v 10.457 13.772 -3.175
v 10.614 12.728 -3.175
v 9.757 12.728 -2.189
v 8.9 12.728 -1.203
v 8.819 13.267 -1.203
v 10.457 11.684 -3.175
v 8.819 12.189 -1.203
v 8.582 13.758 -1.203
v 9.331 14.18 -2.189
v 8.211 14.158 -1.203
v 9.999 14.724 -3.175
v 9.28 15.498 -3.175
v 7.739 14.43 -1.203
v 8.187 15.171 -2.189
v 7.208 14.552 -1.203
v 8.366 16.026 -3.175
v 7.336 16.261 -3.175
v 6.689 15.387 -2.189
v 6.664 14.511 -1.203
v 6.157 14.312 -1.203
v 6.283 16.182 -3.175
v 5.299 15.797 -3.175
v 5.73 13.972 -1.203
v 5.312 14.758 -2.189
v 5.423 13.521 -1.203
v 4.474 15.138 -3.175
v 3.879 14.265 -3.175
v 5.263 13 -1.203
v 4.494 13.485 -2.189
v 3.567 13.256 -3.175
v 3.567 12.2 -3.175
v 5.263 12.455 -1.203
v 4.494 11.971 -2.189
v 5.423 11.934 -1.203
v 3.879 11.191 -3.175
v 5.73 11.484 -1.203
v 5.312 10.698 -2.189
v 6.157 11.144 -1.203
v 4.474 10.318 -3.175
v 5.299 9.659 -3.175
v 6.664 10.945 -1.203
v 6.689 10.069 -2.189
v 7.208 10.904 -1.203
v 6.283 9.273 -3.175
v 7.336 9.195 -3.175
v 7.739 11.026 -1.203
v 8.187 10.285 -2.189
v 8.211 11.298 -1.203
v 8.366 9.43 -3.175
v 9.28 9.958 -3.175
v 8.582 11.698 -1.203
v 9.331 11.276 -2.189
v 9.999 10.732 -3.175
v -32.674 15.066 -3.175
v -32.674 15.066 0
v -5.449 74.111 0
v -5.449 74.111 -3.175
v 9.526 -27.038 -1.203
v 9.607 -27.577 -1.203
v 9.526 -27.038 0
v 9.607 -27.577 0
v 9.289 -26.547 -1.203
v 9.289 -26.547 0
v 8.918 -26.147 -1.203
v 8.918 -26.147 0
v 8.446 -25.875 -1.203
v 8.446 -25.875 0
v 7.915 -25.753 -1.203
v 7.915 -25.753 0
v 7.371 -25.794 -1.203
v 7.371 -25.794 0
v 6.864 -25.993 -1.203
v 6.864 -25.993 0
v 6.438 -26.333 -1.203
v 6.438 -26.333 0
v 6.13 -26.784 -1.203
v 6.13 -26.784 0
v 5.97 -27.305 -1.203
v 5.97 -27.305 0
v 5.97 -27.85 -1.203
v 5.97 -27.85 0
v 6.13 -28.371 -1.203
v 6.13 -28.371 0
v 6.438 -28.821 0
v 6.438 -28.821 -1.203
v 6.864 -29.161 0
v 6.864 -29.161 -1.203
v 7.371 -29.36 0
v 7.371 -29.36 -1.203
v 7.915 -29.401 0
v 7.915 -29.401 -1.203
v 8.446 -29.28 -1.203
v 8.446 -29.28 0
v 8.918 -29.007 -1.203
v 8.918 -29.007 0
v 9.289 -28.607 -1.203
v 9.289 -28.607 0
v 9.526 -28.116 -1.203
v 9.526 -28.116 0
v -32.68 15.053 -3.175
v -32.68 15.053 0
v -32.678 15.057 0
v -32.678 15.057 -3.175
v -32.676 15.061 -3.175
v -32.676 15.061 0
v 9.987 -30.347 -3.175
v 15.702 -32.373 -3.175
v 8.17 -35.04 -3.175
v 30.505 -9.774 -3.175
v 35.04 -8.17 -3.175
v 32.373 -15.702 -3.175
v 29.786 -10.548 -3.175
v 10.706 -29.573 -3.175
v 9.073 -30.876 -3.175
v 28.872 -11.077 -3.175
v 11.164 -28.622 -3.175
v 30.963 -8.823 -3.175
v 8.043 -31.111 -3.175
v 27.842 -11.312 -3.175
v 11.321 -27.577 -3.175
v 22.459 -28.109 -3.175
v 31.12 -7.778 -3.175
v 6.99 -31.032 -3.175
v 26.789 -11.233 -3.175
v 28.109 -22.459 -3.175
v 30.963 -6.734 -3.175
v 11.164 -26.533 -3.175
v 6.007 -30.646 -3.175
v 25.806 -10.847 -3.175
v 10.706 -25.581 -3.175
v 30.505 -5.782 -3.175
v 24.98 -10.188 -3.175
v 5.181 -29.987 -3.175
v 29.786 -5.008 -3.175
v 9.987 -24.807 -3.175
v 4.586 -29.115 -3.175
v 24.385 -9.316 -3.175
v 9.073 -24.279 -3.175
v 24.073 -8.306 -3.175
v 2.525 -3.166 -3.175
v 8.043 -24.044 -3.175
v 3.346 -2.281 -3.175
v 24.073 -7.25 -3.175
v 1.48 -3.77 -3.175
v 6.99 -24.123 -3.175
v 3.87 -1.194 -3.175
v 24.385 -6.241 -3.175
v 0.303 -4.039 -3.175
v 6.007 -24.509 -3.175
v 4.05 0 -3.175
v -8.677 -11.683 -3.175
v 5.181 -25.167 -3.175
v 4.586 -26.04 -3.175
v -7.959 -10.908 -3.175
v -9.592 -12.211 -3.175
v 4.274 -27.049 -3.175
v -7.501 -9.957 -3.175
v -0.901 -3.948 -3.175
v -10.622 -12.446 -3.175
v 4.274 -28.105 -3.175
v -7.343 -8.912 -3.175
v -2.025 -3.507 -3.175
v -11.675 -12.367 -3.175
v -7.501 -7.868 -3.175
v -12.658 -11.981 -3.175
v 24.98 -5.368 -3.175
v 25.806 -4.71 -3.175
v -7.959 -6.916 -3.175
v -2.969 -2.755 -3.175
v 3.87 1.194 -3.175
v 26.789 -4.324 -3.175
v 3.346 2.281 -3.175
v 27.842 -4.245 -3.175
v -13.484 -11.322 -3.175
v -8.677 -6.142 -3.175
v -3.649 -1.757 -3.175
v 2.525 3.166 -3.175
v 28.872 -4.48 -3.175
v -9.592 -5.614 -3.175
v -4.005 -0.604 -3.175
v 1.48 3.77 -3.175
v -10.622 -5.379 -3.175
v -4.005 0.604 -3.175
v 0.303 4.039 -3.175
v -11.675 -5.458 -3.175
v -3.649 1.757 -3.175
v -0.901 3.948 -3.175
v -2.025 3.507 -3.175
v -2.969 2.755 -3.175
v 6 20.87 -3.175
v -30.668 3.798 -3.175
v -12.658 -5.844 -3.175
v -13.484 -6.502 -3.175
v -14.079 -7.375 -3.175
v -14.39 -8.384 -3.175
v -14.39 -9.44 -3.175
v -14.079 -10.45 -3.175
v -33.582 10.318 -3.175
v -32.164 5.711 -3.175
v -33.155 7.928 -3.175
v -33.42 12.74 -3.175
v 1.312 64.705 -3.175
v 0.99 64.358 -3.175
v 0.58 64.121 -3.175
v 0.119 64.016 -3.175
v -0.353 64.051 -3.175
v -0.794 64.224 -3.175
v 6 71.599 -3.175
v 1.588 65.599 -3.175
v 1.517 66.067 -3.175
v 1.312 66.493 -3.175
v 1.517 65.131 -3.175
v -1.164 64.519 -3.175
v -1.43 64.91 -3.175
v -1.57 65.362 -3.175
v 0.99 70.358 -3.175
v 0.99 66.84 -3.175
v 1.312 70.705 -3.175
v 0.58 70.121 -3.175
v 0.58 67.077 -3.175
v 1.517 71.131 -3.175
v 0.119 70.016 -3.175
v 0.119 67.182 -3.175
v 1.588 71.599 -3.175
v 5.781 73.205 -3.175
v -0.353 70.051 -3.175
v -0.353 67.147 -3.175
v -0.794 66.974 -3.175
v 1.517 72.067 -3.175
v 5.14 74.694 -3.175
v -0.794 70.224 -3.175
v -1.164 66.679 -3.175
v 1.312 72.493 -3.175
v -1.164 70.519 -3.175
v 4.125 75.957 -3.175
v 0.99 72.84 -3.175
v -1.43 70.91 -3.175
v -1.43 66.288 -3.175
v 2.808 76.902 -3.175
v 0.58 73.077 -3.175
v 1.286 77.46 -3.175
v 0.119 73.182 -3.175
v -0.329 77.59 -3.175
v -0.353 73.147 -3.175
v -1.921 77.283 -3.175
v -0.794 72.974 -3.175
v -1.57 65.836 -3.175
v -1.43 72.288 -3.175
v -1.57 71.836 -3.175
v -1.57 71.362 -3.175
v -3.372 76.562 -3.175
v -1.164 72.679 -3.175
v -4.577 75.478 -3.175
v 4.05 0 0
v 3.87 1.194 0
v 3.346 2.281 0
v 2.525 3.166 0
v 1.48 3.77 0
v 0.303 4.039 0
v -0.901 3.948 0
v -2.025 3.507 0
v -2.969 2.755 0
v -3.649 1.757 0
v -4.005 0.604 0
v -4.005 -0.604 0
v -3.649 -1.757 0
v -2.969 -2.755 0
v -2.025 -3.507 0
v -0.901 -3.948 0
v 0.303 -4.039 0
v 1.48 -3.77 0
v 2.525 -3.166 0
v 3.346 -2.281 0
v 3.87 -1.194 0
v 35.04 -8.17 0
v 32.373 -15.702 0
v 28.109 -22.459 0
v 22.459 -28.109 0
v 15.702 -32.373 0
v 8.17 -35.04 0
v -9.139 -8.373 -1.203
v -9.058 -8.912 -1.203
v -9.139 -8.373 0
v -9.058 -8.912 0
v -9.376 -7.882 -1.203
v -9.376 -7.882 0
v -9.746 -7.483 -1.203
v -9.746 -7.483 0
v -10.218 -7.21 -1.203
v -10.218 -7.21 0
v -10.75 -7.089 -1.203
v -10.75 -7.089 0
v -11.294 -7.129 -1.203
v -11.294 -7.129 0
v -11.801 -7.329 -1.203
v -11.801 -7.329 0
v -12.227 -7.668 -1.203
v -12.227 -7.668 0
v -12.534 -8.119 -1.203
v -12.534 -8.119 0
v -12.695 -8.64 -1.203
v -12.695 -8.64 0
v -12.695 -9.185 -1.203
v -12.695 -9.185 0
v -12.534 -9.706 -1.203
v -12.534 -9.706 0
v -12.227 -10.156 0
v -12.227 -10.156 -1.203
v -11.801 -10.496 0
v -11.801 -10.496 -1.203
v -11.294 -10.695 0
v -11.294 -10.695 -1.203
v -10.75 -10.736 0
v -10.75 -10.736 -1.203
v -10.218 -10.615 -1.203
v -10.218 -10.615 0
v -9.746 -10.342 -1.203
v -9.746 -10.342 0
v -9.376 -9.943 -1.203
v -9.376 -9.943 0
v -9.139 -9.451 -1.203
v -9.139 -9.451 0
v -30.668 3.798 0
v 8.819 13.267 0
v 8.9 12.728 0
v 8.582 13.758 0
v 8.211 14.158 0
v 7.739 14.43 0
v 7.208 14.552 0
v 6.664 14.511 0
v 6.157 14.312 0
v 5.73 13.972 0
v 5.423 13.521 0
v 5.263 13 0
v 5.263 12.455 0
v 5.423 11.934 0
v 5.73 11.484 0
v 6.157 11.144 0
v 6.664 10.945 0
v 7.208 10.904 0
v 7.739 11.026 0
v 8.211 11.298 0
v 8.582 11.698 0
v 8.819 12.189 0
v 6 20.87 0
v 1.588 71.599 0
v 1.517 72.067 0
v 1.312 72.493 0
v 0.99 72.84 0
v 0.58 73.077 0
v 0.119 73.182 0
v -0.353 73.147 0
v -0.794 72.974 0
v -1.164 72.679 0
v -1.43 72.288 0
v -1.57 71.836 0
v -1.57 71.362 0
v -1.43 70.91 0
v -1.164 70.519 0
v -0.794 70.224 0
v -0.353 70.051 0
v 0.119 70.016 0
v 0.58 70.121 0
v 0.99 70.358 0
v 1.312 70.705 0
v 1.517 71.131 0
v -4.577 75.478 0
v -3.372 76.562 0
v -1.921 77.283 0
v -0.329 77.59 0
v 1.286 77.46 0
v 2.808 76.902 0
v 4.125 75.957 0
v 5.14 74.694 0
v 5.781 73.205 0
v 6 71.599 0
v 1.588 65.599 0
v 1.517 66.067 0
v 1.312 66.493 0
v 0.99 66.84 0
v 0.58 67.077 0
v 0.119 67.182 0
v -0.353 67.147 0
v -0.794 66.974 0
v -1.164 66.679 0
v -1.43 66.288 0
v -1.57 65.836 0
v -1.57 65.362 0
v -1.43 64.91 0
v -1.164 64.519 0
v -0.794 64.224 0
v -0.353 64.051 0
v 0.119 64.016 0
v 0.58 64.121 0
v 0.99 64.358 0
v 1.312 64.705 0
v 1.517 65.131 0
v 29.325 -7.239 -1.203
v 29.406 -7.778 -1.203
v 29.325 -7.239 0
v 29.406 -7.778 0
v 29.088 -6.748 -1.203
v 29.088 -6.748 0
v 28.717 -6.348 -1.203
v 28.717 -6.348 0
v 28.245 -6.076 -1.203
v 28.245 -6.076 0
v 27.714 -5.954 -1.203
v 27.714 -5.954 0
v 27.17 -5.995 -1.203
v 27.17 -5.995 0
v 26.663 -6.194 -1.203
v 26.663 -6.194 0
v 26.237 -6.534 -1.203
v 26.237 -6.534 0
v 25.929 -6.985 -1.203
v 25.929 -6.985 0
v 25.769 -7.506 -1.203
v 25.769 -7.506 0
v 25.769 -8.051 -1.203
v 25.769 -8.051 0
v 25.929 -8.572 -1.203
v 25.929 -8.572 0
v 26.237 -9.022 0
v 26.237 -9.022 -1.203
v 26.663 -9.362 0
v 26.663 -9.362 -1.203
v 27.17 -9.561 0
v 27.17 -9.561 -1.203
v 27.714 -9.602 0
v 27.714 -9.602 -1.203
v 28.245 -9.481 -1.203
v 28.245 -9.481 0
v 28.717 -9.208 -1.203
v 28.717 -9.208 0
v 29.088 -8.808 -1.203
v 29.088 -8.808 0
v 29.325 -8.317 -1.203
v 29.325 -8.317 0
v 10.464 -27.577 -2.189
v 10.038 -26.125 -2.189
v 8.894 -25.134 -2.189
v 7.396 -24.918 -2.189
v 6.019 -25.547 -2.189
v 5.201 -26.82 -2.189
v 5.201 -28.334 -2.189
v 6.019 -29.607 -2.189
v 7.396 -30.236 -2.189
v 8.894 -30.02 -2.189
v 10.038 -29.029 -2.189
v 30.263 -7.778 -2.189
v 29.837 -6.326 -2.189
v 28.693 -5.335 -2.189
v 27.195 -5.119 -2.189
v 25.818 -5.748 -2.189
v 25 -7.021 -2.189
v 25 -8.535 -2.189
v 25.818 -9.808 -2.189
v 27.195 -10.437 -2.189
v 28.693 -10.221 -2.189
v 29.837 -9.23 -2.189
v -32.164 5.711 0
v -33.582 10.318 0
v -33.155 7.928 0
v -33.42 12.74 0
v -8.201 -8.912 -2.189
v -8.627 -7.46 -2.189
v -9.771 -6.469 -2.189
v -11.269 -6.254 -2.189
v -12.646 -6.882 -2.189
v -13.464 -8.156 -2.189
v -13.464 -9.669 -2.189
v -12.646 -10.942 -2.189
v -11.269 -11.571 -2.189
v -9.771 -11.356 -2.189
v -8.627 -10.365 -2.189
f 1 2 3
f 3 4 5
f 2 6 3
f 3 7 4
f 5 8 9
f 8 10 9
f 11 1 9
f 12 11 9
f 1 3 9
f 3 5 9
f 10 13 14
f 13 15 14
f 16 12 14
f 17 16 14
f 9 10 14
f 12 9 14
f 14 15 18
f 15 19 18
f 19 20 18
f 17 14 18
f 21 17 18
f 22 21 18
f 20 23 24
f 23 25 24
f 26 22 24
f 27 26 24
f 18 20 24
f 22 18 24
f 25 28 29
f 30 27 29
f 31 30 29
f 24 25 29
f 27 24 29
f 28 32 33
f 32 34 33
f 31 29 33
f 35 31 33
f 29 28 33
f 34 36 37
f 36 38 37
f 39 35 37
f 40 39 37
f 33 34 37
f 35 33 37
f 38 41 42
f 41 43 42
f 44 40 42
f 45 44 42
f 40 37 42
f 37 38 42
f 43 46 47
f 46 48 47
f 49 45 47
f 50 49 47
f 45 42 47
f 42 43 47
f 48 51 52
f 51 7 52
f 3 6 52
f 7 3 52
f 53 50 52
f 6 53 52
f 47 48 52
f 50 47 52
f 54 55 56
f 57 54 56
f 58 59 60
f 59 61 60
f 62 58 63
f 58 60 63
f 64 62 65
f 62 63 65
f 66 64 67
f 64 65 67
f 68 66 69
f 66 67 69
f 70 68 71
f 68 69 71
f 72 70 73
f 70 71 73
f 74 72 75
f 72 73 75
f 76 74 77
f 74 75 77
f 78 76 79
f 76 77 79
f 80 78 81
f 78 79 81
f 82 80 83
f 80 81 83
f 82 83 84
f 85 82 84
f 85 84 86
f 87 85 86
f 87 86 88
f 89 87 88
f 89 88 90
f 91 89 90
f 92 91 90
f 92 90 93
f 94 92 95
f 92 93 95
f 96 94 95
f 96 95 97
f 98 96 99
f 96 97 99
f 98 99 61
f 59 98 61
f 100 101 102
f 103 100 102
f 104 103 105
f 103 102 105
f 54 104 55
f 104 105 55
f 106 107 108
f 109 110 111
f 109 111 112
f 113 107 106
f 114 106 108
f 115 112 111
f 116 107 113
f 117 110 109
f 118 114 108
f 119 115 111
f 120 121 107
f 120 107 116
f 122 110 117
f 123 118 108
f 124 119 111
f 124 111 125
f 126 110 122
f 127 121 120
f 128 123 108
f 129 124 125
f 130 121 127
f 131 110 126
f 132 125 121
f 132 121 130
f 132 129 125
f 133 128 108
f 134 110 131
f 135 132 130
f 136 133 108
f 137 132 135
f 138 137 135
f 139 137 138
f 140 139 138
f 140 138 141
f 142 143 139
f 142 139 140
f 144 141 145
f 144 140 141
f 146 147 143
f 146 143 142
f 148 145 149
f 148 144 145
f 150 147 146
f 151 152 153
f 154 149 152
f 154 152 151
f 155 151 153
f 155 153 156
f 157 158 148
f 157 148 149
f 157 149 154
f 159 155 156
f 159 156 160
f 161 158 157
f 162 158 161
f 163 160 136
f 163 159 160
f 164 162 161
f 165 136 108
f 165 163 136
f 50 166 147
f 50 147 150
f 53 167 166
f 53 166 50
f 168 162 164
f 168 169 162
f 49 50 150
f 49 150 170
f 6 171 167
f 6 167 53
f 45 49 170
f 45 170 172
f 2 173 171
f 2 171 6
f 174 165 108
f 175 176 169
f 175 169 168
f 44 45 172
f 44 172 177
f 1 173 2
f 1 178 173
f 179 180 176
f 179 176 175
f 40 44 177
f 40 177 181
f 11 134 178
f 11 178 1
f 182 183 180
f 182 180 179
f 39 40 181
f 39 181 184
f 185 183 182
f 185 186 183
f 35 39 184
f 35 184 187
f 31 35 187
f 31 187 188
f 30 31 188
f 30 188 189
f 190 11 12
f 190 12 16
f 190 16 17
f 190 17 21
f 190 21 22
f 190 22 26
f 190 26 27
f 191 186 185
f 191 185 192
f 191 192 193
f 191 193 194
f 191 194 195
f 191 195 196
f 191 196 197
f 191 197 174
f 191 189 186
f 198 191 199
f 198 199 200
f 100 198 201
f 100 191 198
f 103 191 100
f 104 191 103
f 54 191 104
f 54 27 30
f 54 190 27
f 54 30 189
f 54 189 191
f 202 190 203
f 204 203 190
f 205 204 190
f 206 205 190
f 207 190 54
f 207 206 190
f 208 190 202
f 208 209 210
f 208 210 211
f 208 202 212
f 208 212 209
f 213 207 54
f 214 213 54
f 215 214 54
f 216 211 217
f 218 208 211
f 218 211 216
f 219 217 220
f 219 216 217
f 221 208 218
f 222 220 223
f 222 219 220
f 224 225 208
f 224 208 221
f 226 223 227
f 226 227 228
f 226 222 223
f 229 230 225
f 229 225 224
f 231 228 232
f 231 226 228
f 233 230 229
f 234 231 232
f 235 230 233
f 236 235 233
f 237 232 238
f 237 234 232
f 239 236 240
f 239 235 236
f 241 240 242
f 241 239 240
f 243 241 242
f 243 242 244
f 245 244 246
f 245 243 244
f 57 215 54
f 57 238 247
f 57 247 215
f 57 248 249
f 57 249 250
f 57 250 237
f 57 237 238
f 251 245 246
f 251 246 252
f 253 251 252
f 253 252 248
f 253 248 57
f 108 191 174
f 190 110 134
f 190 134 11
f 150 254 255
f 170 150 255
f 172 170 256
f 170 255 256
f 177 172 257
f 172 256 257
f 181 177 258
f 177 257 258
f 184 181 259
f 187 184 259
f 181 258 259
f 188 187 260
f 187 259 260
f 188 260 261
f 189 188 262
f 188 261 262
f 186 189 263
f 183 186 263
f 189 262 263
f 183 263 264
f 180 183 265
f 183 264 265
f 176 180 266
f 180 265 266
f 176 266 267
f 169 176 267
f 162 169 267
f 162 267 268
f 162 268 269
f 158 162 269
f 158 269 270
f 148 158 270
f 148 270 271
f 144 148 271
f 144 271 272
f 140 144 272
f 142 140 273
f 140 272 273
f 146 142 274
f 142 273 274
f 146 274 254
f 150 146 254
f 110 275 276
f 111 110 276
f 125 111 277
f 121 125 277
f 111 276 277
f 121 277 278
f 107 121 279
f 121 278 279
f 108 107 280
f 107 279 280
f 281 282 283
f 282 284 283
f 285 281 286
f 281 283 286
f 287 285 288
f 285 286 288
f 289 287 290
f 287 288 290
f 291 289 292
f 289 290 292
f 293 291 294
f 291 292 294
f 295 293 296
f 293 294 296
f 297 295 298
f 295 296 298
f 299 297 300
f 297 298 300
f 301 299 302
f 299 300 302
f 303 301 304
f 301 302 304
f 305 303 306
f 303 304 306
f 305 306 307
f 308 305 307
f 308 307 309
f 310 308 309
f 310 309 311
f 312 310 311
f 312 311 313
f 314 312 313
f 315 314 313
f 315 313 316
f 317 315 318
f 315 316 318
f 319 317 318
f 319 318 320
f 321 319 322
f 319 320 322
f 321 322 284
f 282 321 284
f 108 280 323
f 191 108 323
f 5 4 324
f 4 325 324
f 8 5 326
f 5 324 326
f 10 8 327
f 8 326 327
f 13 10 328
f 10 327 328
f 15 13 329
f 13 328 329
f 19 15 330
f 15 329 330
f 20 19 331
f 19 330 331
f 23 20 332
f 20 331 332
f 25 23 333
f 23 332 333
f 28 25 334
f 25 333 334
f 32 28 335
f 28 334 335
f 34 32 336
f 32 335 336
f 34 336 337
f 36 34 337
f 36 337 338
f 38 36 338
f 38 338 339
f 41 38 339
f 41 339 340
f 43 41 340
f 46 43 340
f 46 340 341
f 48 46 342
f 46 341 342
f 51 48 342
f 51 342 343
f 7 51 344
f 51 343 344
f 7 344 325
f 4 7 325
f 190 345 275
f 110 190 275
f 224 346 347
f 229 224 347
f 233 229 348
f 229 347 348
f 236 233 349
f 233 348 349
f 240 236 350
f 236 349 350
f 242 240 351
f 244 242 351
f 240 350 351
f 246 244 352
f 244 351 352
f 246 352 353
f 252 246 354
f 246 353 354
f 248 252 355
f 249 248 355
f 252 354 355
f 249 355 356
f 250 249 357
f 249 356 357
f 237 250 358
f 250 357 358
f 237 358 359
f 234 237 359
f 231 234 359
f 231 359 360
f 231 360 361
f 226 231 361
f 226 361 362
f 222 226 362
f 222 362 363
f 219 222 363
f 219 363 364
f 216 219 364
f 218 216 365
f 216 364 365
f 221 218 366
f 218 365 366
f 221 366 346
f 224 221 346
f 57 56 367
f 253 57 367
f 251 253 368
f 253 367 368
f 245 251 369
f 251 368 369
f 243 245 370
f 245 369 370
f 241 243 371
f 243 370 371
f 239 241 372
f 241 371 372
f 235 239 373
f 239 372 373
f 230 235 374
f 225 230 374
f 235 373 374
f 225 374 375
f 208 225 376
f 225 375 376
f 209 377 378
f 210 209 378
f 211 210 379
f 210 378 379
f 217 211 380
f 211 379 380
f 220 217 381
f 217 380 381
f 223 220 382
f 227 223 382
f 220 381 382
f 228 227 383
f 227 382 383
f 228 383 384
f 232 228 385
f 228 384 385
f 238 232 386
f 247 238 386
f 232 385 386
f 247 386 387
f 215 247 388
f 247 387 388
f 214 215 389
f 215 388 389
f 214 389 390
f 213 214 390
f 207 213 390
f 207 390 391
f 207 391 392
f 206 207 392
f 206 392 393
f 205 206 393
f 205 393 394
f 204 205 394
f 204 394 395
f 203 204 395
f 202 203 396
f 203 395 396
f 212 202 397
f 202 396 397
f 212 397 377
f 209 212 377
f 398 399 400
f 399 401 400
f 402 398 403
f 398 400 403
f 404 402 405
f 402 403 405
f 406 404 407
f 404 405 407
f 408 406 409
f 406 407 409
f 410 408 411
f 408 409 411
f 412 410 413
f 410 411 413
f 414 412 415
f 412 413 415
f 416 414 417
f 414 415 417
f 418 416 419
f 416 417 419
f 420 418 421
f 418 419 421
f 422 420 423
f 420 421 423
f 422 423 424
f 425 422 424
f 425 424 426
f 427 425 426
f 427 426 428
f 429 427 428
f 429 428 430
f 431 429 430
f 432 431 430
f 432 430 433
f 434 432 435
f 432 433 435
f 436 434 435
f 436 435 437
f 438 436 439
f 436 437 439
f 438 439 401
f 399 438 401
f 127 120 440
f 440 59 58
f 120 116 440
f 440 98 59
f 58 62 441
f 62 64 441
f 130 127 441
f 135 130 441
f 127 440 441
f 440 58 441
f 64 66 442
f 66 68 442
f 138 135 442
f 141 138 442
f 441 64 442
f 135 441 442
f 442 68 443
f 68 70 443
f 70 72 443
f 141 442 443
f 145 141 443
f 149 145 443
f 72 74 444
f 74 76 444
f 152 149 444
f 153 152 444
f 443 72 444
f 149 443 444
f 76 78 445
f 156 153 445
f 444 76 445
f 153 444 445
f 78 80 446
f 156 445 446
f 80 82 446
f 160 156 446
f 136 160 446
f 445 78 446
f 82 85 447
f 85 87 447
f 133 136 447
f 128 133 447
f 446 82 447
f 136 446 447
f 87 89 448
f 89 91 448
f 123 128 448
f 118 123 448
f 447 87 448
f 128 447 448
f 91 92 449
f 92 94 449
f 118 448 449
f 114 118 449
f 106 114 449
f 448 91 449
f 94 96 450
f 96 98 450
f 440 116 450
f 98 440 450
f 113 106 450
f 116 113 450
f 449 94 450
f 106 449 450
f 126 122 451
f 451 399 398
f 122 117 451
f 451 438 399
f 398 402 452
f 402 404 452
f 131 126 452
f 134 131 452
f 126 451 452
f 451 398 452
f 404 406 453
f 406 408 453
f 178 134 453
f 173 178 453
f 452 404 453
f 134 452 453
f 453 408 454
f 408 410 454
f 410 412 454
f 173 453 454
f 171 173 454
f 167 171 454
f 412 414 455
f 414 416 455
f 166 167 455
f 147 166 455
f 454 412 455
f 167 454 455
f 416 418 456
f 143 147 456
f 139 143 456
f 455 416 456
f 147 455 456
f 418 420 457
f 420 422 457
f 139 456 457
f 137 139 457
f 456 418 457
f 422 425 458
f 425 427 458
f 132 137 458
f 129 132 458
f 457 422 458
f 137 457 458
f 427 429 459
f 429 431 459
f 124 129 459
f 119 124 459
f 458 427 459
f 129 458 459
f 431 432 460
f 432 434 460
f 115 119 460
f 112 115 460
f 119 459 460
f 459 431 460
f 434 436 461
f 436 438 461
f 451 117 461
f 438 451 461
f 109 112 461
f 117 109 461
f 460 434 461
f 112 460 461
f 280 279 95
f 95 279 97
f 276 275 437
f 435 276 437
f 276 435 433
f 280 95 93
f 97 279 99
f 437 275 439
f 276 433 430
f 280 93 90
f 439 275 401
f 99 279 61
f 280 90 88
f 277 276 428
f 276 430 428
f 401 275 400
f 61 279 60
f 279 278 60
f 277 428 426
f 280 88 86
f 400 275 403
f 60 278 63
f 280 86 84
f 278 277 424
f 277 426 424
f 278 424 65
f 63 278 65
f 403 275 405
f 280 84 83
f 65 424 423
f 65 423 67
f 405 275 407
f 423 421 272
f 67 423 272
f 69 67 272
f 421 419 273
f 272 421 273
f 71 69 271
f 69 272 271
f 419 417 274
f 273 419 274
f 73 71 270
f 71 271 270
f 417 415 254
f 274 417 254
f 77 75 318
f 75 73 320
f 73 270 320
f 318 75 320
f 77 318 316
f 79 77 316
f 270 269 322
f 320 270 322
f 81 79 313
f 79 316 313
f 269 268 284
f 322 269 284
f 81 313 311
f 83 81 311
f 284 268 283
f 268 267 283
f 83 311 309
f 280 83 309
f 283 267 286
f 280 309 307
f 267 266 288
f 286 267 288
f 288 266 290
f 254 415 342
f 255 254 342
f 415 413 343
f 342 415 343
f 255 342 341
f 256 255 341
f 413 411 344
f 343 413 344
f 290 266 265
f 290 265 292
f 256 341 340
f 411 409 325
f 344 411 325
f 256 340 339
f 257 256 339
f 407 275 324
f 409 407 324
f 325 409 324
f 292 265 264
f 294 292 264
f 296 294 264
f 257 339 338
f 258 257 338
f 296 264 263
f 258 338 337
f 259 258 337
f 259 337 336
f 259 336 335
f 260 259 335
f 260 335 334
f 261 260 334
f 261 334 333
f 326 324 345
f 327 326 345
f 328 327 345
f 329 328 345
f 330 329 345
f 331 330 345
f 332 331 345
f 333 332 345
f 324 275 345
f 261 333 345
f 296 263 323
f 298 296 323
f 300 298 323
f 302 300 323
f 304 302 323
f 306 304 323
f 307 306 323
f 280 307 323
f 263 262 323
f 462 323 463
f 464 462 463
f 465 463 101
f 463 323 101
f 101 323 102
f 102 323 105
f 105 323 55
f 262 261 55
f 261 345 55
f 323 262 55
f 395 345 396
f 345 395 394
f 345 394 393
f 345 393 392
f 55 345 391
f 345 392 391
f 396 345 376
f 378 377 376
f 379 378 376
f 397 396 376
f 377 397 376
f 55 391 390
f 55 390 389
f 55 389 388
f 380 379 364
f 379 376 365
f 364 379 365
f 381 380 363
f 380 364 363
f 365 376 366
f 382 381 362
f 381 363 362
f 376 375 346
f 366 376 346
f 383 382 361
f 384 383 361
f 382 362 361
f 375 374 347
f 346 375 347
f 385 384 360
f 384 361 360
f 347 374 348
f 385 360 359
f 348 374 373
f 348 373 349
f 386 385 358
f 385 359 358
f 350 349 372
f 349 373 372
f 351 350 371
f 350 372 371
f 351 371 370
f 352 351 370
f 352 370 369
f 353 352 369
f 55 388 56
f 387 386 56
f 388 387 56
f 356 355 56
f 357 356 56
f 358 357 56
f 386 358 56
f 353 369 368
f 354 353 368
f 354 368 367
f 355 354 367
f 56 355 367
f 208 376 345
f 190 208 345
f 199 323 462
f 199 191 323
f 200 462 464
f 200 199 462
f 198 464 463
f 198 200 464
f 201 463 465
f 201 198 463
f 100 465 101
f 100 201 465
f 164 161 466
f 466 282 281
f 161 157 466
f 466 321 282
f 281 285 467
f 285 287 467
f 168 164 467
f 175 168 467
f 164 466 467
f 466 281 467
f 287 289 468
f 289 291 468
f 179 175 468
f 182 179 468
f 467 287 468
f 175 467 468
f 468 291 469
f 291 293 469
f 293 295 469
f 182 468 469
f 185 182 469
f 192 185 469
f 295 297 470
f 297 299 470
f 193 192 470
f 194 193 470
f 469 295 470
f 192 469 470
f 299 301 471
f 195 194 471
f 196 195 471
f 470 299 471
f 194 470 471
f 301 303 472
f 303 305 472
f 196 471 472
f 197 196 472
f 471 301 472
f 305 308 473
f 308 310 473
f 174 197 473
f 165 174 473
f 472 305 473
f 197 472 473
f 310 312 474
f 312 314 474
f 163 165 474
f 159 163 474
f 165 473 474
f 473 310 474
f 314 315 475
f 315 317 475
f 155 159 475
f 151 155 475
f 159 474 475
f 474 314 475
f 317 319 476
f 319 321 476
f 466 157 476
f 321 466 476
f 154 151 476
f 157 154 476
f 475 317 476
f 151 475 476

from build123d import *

# Parameters (mm, degrees)
SKETCH2_R                                      = 1.5875
SKETCH2_R_2                                    = 4.05
BOSS_EXTRUDE1_DEPTH                            = 3.175
CSK_FOR_6_FLAT_HEAD_MACHINE_SCREW1_D           = 3.6576
CSK_FOR_6_FLAT_HEAD_MACHINE_SCREW1_DEPTH       = 10.973
CSK_FOR_6_FLAT_HEAD_MACHINE_SCREW1_CSINK_D     = 7.0866
CSK_FOR_6_FLAT_HEAD_MACHINE_SCREW1_CSINK_ANGLE = 82
CSK_FOR_6_FLAT_HEAD_MACHINE_SCREW1_TIP         = 1.0988539
FILLET1_R                                      = 10


with BuildPart() as part:
    # Sketch2 → Boss-Extrude1 (new body)
    with BuildSketch(Plane.XY):
        with BuildLine():
            Line((8.170067778, -35.040125463), (-35.040125463, 8.170067778))
            ThreePointArc((-35.040125463, 8.170067778), (-34.032148119, 11.677897689), (-32.673983585, 15.065563272))
            Line((-32.673983585, 15.065563272), (-5.448690981, 74.111398302))
            ThreePointArc((-5.448690981, 74.111398302), (1.286050954, 77.459627628), (6, 71.599075355))
            Line((6, 71.599075355), (6, 20.870057685))
            Line((6, 20.870057685), (35.040125463, -8.170067778))
            ThreePointArc((35.040125463, -8.170067778), (25.441701987, -25.441701987), (8.170067778, -35.040125463))
        make_face()
        with Locations((0, 71.599075355)):
            Circle(SKETCH2_R, mode=Mode.SUBTRACT)
        with Locations((0, 65.599075355)):
            Circle(SKETCH2_R, mode=Mode.SUBTRACT)
        Circle(SKETCH2_R_2, mode=Mode.SUBTRACT)
    extrude(amount=-BOSS_EXTRUDE1_DEPTH)

    # CSK for #6 Flat Head Machine Screw1
    with Locations(Plane(origin=(0, 0, -3.175), x_dir=(-1, 0, 0), z_dir=(0, 0, -1))):
        with Locations((-7.071067812, 12.727922061), (-27.577164466, -7.778174593), (10.886616003, -8.91237387), (-7.778174593, -27.577164466)):
            CounterSinkHole(CSK_FOR_6_FLAT_HEAD_MACHINE_SCREW1_D / 2, CSK_FOR_6_FLAT_HEAD_MACHINE_SCREW1_CSINK_D / 2, depth=CSK_FOR_6_FLAT_HEAD_MACHINE_SCREW1_DEPTH, counter_sink_angle=CSK_FOR_6_FLAT_HEAD_MACHINE_SCREW1_CSINK_ANGLE)
            with Locations((0, 0, -(CSK_FOR_6_FLAT_HEAD_MACHINE_SCREW1_DEPTH + CSK_FOR_6_FLAT_HEAD_MACHINE_SCREW1_TIP / 2))):  # 118° drill point
                Cone(0, CSK_FOR_6_FLAT_HEAD_MACHINE_SCREW1_D / 2, CSK_FOR_6_FLAT_HEAD_MACHINE_SCREW1_TIP, mode=Mode.SUBTRACT)

    # Fillet1
    fillet1_edges = [part.edges().sort_by_distance(p)[0] for p in [
        (-35.040125463, 8.170067778, -1.5875),
    ]]
    fillet(fillet1_edges, radius=FILLET1_R)


solid = part.part
